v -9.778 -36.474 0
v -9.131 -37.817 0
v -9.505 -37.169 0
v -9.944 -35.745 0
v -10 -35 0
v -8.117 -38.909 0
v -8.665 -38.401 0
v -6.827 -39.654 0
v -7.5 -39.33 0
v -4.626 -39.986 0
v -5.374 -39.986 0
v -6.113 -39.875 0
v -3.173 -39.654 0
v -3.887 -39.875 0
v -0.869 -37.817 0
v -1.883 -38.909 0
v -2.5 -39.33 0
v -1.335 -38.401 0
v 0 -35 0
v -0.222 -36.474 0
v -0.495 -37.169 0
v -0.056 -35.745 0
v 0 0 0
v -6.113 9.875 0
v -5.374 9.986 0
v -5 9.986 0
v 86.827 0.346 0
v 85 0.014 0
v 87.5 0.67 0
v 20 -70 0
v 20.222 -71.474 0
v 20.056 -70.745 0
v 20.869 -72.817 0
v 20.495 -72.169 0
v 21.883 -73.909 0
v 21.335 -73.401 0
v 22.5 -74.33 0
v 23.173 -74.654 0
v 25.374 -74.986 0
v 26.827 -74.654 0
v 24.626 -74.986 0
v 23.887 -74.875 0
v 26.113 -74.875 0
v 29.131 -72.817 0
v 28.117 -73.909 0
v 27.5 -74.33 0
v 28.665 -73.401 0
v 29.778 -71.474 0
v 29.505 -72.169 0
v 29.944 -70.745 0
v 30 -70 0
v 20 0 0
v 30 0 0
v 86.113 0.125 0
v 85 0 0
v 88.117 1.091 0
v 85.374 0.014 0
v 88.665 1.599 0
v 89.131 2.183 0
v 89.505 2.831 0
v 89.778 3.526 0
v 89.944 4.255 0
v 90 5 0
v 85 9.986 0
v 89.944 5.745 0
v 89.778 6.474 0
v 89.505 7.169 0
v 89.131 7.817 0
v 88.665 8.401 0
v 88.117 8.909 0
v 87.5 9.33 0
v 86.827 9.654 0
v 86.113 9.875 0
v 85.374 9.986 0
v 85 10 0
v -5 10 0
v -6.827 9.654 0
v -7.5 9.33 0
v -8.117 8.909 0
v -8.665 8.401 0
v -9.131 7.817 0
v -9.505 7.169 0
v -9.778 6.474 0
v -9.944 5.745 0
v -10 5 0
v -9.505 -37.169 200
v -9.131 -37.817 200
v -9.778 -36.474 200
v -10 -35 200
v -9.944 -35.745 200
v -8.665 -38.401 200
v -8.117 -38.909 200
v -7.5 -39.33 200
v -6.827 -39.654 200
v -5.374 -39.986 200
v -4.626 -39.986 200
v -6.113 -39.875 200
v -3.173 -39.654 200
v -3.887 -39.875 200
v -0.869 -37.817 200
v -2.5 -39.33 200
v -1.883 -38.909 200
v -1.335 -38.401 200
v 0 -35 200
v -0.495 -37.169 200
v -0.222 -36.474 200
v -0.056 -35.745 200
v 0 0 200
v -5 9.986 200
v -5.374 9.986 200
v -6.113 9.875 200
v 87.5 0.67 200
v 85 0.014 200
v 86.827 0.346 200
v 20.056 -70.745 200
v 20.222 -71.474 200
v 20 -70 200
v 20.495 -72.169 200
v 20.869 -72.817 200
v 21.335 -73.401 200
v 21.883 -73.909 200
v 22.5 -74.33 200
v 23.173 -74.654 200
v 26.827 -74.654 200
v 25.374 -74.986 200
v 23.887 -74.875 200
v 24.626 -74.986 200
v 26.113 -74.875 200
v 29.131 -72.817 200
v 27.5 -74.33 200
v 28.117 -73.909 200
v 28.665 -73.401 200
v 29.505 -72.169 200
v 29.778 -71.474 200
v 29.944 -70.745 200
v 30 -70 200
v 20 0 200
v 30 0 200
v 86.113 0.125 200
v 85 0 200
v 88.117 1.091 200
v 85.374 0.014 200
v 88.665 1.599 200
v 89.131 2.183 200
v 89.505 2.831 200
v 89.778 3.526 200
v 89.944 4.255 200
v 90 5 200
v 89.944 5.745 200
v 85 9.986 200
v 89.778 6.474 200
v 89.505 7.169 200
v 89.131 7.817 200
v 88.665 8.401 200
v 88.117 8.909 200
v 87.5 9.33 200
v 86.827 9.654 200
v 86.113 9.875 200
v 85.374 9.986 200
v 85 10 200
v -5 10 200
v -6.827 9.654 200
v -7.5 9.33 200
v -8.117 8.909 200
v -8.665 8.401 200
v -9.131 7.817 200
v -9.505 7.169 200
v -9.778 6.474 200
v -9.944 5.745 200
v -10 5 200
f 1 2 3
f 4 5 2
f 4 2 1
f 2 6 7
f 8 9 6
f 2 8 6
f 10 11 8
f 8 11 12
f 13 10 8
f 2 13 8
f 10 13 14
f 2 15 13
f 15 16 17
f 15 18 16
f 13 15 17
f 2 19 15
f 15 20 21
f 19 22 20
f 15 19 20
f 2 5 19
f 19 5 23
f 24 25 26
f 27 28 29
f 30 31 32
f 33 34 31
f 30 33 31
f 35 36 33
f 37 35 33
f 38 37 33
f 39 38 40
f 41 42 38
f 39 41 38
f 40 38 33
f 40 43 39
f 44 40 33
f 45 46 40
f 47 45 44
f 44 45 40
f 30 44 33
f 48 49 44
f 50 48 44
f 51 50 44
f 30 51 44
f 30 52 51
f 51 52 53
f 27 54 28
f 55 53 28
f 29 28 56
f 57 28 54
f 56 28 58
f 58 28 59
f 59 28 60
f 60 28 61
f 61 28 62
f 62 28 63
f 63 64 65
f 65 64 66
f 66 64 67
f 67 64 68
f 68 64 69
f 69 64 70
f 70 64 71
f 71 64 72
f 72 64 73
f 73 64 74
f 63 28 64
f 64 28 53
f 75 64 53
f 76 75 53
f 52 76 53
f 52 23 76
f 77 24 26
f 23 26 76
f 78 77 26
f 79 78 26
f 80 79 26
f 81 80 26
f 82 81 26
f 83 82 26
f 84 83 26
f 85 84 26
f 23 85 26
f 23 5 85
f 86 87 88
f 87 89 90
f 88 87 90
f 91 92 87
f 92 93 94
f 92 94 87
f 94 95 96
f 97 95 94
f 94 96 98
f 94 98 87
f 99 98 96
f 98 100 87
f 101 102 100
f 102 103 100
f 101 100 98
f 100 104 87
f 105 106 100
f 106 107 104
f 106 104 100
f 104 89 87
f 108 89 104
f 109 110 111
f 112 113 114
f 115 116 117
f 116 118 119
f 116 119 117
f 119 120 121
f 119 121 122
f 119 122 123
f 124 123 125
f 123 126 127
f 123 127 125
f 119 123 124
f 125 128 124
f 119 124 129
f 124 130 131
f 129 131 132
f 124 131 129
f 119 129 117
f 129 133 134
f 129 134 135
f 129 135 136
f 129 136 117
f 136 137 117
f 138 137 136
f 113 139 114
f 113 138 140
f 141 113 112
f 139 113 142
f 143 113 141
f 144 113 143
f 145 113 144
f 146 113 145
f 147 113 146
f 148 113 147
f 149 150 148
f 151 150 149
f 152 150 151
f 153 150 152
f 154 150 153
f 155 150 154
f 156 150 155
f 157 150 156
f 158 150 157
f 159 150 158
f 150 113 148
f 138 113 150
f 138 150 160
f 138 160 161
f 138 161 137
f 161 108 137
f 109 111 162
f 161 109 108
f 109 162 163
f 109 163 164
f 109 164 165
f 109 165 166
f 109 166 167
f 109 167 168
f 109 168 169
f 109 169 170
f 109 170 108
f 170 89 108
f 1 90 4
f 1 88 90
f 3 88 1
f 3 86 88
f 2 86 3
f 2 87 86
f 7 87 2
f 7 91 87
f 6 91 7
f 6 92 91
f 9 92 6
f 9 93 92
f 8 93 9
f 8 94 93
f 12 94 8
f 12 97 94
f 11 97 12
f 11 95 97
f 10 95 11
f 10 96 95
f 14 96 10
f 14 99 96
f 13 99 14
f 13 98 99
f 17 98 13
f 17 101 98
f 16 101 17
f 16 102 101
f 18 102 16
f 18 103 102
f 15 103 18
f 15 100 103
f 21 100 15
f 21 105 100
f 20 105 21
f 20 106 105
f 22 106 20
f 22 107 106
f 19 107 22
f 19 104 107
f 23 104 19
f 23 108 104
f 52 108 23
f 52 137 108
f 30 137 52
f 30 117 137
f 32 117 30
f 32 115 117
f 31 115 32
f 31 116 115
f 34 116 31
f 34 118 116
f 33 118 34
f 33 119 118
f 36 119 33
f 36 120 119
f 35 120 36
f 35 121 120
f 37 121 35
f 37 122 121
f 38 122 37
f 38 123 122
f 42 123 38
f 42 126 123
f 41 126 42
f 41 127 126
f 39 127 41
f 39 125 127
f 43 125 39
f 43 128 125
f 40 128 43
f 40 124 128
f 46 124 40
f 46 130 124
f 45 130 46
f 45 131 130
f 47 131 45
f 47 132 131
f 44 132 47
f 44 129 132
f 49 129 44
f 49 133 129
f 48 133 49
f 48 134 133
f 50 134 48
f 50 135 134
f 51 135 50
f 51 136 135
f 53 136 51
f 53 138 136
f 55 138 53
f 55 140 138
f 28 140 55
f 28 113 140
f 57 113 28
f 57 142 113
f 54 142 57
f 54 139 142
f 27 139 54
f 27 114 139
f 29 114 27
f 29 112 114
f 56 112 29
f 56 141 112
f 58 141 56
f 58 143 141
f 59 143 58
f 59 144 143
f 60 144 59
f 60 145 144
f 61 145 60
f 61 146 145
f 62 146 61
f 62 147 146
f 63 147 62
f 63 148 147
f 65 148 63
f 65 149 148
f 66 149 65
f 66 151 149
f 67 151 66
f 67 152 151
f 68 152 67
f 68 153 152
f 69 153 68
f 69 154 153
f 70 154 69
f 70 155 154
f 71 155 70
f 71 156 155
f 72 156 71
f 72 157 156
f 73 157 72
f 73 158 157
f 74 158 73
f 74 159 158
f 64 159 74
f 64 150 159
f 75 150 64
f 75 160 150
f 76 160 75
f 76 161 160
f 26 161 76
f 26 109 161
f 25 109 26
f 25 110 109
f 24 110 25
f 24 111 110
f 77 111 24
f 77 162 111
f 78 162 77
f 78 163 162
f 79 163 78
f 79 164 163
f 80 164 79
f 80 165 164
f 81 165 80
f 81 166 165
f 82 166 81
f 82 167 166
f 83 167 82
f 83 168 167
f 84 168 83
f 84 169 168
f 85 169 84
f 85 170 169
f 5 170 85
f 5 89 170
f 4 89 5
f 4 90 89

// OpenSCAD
Width = 100;
Length = 200;
Thickness = 10;
Outer_Leg_Depth = 40;
Inner_Leg_Depth = 75;
Leg_Separation = 20;
Chamfer_Size = 0;

r = Thickness / 2;
$fa = $preview ? 15 : 1;
$fs = $preview ? 3 : 0.75;

if ($preview) {
	rotate(90, [1,0,0])
		translate([0, 0, -Length/2])
			draw();
} else {
	draw();
}

module draw() {
	translate([0, 0, Chamfer_Size])
		linear_extrude(Length-Chamfer_Size*2)
			outline();
}

module outline() {
	// Top plate
	translate([-r, r, 0])
		circle(d=Thickness);
	translate([-r, 0, 0])
		square([Width-Thickness, Thickness]);
	translate([Width-Thickness-r, r, 0])
		circle(d=Thickness);

	// Outer leg
	translate([-Thickness, r-Outer_Leg_Depth, 0])
		square([Thickness, Outer_Leg_Depth]);
	translate([-r, r-Outer_Leg_Depth, 0])
		circle(d=Thickness);

	// Inner leg
	translate([Leg_Separation, r-Inner_Leg_Depth, 0])
		square([Thickness, Inner_Leg_Depth]);
	translate([Leg_Separation+r, r-Inner_Leg_Depth, 0])
		circle(d=Thickness);
}
